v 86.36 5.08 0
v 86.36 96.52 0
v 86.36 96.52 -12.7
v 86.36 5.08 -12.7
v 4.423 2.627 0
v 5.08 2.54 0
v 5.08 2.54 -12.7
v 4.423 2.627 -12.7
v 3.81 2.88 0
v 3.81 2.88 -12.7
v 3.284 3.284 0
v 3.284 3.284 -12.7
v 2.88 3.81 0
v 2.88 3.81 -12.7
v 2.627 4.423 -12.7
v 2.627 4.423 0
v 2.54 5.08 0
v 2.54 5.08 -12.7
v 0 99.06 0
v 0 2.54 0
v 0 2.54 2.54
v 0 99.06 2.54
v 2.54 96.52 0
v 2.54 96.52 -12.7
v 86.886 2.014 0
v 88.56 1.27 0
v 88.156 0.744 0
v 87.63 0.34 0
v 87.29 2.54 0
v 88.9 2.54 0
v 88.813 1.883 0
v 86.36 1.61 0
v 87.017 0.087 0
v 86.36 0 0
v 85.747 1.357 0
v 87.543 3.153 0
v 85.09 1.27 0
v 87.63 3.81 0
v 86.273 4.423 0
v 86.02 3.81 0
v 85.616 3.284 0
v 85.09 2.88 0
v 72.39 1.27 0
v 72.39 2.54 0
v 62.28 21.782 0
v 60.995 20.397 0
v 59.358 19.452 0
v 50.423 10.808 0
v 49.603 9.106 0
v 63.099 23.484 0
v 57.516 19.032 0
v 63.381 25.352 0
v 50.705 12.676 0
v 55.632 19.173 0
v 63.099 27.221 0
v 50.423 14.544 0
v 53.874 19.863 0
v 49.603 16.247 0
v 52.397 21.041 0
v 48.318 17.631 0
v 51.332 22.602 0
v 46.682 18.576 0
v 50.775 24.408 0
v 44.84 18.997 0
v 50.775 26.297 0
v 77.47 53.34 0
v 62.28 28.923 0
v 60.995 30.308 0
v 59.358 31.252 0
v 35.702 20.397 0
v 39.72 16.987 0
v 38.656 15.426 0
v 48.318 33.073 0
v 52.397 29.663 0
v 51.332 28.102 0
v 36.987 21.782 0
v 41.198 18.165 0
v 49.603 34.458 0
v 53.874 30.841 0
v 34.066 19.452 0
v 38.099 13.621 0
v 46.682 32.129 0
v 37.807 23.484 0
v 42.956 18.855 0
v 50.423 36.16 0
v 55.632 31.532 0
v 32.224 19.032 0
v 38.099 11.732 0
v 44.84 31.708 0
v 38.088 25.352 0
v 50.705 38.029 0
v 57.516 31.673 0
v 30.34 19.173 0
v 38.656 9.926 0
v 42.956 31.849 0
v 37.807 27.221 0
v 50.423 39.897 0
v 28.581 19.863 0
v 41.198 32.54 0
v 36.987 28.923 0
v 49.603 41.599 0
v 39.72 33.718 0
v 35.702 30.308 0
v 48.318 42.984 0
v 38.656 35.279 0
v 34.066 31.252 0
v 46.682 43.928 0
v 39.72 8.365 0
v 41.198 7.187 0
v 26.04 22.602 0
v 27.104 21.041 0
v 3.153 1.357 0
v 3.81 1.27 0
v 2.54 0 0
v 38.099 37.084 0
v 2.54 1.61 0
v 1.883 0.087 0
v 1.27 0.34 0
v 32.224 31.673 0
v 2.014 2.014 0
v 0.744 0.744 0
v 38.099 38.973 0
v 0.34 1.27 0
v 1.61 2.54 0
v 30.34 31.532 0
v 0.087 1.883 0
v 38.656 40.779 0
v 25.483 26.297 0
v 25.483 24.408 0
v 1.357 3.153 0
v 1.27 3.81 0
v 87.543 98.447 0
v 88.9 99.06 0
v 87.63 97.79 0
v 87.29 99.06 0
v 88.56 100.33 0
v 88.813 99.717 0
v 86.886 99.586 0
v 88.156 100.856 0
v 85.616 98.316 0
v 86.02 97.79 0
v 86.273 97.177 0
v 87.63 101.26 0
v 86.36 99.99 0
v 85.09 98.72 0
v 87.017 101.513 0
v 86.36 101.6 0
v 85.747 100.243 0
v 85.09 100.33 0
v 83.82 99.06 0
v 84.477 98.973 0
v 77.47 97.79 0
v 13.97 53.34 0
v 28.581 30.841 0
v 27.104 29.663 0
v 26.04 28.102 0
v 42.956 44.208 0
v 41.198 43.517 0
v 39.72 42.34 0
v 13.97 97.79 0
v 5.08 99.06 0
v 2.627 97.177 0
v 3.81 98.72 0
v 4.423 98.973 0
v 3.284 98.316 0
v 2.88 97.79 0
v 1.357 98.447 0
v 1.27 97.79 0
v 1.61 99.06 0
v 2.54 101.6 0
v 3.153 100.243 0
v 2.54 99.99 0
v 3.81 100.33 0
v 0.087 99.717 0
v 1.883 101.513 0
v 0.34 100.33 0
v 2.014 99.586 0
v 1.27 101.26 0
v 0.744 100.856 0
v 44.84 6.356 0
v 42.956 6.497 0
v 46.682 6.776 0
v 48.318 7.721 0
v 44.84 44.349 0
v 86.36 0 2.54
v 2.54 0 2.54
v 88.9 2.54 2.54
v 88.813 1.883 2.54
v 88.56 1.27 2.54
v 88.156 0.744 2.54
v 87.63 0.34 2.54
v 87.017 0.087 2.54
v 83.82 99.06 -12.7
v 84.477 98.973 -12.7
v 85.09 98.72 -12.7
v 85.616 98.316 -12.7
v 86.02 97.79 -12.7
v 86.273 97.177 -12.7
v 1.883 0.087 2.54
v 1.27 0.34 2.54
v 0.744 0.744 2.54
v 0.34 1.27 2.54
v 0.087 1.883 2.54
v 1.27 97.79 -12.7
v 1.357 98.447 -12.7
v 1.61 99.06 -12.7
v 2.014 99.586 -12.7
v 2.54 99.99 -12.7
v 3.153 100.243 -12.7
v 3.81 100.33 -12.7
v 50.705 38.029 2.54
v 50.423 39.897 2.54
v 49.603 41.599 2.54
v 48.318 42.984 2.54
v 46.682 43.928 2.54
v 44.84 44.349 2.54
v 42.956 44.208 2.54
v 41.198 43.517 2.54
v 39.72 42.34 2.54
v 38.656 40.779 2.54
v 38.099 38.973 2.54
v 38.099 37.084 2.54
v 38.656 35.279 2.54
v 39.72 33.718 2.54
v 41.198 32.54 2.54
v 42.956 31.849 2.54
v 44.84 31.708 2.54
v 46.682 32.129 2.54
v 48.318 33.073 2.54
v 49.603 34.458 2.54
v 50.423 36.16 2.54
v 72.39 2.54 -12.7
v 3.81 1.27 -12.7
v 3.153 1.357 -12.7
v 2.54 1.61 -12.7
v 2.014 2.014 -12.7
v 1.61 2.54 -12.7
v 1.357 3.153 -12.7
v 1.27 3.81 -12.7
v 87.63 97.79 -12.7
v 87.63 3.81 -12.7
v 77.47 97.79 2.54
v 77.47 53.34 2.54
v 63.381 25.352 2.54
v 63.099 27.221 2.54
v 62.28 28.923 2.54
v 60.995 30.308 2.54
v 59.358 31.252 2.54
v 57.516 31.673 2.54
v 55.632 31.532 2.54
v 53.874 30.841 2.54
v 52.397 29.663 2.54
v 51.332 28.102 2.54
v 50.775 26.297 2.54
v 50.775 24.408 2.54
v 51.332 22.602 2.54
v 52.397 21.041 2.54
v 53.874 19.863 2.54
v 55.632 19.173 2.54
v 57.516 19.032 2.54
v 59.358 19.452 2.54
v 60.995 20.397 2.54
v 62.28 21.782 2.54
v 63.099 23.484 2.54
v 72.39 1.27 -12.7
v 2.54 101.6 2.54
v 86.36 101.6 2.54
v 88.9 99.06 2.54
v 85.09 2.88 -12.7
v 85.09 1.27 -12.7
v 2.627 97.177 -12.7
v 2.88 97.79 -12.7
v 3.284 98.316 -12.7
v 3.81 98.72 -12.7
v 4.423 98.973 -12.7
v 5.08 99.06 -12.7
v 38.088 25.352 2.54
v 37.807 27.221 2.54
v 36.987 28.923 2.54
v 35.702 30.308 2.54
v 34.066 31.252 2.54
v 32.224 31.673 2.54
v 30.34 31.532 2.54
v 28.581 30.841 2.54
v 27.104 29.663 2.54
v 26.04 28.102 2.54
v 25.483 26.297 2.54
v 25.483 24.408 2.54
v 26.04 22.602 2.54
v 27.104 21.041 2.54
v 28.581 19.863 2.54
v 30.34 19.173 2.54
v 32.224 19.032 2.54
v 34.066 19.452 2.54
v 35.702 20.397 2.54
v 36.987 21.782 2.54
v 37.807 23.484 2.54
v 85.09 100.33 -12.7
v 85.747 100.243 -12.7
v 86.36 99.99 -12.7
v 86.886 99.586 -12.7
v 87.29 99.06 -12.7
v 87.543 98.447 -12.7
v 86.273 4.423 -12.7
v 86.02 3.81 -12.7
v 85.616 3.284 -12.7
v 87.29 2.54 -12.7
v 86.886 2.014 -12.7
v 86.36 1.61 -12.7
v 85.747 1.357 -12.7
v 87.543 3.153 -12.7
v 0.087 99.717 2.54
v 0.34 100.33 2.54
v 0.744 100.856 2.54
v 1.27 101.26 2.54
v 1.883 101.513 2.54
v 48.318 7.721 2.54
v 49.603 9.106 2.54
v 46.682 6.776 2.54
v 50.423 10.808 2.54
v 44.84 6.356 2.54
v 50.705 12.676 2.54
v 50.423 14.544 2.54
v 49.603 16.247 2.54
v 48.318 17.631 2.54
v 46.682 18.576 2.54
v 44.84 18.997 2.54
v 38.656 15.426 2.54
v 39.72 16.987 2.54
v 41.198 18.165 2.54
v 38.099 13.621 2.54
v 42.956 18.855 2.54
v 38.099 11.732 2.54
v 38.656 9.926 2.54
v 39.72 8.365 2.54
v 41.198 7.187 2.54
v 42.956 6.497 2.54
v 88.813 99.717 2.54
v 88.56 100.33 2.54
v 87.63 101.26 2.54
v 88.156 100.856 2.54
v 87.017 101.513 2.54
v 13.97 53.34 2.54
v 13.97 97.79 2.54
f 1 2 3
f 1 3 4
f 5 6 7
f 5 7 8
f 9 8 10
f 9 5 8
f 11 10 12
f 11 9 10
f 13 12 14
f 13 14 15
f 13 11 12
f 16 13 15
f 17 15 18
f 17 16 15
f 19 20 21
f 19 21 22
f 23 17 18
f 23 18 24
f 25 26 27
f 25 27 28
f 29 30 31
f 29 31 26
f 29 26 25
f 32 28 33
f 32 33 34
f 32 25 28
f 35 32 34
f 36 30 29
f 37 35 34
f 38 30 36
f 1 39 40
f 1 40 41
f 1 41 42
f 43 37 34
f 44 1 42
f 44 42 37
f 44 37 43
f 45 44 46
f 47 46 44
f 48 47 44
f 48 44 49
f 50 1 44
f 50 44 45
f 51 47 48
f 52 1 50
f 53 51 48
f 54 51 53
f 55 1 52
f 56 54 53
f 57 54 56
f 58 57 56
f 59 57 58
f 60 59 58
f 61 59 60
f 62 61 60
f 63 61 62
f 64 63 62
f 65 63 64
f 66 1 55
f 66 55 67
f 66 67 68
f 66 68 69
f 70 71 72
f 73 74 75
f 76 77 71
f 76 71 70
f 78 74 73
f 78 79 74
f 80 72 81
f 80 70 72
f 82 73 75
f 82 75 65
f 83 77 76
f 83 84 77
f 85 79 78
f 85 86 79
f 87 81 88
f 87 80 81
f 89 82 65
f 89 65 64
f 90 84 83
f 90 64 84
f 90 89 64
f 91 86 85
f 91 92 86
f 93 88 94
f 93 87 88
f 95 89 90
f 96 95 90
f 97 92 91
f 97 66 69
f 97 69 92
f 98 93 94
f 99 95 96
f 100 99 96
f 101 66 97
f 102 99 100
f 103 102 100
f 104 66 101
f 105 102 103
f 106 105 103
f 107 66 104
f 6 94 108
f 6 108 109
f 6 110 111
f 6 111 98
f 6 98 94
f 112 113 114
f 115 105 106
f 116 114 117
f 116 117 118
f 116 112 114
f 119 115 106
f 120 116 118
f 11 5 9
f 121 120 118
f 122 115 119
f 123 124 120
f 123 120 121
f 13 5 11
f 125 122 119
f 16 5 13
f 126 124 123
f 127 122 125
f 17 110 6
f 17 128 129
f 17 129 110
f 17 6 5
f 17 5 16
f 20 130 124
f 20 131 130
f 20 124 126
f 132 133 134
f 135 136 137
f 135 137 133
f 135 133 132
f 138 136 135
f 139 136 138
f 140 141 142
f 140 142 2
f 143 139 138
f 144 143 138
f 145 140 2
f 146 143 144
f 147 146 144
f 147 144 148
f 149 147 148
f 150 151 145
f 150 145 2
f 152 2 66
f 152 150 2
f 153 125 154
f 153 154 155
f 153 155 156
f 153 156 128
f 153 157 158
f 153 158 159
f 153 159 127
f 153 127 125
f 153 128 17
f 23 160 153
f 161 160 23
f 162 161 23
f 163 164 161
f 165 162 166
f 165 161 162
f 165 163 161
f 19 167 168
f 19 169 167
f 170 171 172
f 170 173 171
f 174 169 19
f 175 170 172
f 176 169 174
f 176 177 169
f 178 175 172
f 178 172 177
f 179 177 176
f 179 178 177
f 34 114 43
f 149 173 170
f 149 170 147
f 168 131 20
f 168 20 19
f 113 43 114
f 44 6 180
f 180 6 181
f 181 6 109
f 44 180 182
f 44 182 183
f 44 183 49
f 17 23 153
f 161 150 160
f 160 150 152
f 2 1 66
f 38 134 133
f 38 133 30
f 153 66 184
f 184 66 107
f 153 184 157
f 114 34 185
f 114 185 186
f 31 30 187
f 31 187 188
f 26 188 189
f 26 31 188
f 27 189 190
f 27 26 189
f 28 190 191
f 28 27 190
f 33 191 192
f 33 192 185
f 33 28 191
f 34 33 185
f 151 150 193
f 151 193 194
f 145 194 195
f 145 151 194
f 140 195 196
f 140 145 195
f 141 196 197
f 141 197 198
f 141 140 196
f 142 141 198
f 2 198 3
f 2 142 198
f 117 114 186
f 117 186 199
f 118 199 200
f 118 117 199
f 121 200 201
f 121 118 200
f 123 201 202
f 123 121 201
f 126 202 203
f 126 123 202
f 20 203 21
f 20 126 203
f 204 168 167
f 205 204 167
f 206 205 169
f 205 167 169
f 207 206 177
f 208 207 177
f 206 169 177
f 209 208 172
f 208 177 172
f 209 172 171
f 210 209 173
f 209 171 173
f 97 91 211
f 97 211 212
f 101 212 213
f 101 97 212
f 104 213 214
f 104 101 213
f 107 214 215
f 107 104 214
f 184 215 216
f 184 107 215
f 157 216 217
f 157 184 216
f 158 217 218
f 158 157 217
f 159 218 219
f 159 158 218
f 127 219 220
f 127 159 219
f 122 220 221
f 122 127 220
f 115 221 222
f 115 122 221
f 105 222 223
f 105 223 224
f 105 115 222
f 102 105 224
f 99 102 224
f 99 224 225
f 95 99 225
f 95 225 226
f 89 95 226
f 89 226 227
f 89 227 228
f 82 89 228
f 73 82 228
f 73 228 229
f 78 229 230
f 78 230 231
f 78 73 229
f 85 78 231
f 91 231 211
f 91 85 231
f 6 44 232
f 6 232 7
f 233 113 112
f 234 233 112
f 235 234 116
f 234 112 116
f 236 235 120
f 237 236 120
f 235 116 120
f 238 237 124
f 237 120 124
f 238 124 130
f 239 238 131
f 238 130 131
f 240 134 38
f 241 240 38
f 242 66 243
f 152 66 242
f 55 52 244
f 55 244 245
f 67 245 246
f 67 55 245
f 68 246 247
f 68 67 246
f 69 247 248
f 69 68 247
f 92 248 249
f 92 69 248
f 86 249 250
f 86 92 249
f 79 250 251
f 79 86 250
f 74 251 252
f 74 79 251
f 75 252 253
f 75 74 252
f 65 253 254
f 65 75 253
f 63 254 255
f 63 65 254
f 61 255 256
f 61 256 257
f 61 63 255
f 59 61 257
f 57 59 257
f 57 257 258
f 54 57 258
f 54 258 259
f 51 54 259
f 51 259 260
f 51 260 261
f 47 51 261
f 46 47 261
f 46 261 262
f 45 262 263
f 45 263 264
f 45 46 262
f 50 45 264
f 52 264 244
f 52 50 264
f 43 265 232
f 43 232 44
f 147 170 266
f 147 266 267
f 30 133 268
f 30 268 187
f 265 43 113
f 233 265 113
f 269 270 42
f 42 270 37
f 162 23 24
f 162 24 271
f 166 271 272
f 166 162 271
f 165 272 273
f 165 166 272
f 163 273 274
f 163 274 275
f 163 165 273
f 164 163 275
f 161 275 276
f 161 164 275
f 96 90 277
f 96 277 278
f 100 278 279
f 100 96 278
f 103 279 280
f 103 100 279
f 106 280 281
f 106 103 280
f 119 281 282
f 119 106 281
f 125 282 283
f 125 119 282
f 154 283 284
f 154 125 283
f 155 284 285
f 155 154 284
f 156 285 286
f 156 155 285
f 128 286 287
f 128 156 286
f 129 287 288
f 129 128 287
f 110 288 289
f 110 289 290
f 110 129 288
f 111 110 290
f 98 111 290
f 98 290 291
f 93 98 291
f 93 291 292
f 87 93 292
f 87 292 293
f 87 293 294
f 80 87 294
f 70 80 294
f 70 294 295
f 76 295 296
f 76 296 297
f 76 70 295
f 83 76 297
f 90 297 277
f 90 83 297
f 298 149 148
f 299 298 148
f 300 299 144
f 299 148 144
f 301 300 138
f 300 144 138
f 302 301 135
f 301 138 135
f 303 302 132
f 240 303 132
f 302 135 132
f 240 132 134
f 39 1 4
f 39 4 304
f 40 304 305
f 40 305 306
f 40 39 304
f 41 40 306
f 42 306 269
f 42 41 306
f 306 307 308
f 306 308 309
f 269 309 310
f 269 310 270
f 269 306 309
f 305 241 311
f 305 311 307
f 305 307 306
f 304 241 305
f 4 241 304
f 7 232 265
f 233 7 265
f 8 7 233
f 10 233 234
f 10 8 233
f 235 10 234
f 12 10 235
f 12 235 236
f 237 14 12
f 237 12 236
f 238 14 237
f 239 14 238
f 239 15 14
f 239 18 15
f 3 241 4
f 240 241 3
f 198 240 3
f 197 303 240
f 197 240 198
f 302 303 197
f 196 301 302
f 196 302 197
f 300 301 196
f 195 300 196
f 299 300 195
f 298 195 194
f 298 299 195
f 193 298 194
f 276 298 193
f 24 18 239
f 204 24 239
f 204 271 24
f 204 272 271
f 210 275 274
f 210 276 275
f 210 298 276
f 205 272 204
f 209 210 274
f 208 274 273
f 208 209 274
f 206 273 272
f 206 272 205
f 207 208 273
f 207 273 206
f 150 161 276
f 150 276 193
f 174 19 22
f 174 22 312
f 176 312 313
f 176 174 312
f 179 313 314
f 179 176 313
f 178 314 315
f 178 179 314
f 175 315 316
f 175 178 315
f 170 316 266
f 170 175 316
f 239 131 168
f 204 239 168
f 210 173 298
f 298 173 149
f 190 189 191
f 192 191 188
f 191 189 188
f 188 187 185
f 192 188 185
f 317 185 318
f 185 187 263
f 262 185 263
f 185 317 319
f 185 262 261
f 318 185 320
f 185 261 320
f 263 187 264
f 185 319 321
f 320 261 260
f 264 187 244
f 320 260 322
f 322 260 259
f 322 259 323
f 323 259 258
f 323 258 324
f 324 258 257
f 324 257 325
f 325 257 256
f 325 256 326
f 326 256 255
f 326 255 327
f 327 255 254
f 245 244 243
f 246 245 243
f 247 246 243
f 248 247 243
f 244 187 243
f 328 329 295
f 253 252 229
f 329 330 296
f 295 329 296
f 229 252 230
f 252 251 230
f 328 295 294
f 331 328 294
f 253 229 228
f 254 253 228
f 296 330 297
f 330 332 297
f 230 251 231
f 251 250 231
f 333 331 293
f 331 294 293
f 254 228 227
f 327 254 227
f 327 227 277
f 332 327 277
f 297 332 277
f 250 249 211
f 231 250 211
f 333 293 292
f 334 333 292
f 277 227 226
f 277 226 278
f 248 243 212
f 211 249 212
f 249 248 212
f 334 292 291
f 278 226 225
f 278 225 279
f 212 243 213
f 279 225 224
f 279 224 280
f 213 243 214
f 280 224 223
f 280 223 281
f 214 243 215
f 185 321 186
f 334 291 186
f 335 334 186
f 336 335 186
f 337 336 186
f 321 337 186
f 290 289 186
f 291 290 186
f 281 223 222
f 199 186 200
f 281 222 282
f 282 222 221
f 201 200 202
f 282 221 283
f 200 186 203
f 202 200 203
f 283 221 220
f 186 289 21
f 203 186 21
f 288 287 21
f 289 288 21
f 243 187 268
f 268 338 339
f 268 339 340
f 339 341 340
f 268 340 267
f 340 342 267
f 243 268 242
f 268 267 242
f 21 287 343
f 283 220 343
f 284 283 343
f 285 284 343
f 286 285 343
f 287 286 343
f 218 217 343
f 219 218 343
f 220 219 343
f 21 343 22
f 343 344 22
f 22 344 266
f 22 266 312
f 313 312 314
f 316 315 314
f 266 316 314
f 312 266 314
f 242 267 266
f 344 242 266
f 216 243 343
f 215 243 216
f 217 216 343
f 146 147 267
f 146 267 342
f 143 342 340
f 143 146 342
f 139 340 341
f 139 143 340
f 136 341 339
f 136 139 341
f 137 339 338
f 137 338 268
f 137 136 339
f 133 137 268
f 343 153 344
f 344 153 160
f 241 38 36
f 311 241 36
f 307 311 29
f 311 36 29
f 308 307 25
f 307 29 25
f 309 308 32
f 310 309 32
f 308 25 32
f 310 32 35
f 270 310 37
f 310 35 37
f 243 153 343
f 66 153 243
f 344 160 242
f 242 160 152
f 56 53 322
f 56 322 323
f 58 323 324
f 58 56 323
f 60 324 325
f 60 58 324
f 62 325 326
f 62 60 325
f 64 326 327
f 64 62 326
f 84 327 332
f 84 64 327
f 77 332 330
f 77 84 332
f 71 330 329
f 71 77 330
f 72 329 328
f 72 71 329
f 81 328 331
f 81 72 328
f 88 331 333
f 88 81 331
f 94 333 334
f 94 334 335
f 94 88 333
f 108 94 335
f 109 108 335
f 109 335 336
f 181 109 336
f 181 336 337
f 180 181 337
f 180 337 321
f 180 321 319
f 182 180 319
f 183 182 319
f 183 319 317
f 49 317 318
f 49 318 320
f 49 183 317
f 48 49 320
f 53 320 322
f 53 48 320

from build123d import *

# Parameters (mm, degrees)
SKETCH1_R           = 6.338085432
SKETCH1_W           = 63.5
SKETCH1_H           = 44.45
BOSS_EXTRUDE1_DEPTH = 2.54
BOSS_EXTRUDE2_DEPTH = 12.7
CUT_EXTRUDE1_REACH  = 136.65
SKETCH3_W           = 12.7
SKETCH3_H           = 12.7


with BuildPart() as part:
    # Sketch1 → Boss-Extrude1 (new body)
    with BuildSketch(Plane.XY):
        with BuildLine():
            Line((88.9, 99.06), (88.9, 2.54))
            ThreePointArc((88.9, 2.54), (88.156051224, 0.743948776), (86.36, 0))
            Line((86.36, 0), (2.54, 0))
            ThreePointArc((2.54, 0), (0.743948776, 0.743948776), (0, 2.54))
            Line((0, 2.54), (0, 99.06))
            ThreePointArc((0, 99.06), (0.743948776, 100.856051224), (2.54, 101.6))
            Line((2.54, 101.6), (86.36, 101.6))
            ThreePointArc((86.36, 101.6), (88.156051224, 100.856051224), (88.9, 99.06))
        make_face()
        with Locations((31.75, 25.352341726)):
            Circle(SKETCH1_R, mode=Mode.SUBTRACT)
        with Locations((44.366598021, 38.028512589)):
            Circle(SKETCH1_R, mode=Mode.SUBTRACT)
        with Locations((57.042768884, 25.352341726)):
            Circle(SKETCH1_R, mode=Mode.SUBTRACT)
        with Locations((44.366598021, 12.676170863)):
            Circle(SKETCH1_R, mode=Mode.SUBTRACT)
        with Locations((45.72, 75.565)):
            Rectangle(SKETCH1_W, SKETCH1_H, mode=Mode.SUBTRACT)
    extrude(amount=BOSS_EXTRUDE1_DEPTH)

    # Sketch2 → Boss-Extrude2 (add)
    with BuildSketch(Plane(origin=(0, 0, 0), x_dir=(-1, 0, 0), z_dir=(0, 0, -1))):
        with BuildLine():
            Line((-3.81, 100.33), (-85.09, 100.33))
            ThreePointArc((-85.09, 100.33), (-86.886051224, 99.586051224), (-87.63, 97.79))
            Line((-87.63, 97.79), (-87.63, 3.81))
            ThreePointArc((-87.63, 3.81), (-86.886051224, 2.013948776), (-85.09, 1.27))
            Line((-85.09, 1.27), (-3.81, 1.27))
            ThreePointArc((-3.81, 1.27), (-2.013948776, 2.013948776), (-1.27, 3.81))
            Line((-1.27, 3.81), (-1.27, 97.79))
            ThreePointArc((-1.27, 97.79), (-2.013948776, 99.586051224), (-3.81, 100.33))
        make_face()
        with BuildLine():
            ThreePointArc((-83.82, 99.06), (-85.616051224, 98.316051224), (-86.36, 96.52))
            Line((-86.36, 96.52), (-86.36, 5.08))
            ThreePointArc((-86.36, 5.08), (-85.616051224, 3.283948776), (-83.82, 2.54))
            Line((-83.82, 2.54), (-5.08, 2.54))
            ThreePointArc((-5.08, 2.54), (-3.283948776, 3.283948776), (-2.54, 5.08))
            Line((-2.54, 5.08), (-2.54, 96.52))
            ThreePointArc((-2.54, 96.52), (-3.283948776, 98.316051224), (-5.08, 99.06))
            Line((-5.08, 99.06), (-83.82, 99.06))
        make_face(mode=Mode.SUBTRACT)
    extrude(amount=BOSS_EXTRUDE2_DEPTH)

    # Sketch3 → Cut-Extrude1 (cut, up to next)
    with BuildSketch(Plane.XZ.offset(-1.27), mode=Mode.PRIVATE) as cut_extrude1_sk1:
        with Locations((78.74, -6.35)):
            Rectangle(SKETCH3_W, SKETCH3_H)
    cut_extrude1_tool1 = extrude(cut_extrude1_sk1.sketch, amount=-CUT_EXTRUDE1_REACH, mode=Mode.PRIVATE) & part.part
    add(cut_extrude1_tool1.solids().sort_by_distance((78.74, 1.27, -6.35))[0], mode=Mode.SUBTRACT)


solid = part.part
